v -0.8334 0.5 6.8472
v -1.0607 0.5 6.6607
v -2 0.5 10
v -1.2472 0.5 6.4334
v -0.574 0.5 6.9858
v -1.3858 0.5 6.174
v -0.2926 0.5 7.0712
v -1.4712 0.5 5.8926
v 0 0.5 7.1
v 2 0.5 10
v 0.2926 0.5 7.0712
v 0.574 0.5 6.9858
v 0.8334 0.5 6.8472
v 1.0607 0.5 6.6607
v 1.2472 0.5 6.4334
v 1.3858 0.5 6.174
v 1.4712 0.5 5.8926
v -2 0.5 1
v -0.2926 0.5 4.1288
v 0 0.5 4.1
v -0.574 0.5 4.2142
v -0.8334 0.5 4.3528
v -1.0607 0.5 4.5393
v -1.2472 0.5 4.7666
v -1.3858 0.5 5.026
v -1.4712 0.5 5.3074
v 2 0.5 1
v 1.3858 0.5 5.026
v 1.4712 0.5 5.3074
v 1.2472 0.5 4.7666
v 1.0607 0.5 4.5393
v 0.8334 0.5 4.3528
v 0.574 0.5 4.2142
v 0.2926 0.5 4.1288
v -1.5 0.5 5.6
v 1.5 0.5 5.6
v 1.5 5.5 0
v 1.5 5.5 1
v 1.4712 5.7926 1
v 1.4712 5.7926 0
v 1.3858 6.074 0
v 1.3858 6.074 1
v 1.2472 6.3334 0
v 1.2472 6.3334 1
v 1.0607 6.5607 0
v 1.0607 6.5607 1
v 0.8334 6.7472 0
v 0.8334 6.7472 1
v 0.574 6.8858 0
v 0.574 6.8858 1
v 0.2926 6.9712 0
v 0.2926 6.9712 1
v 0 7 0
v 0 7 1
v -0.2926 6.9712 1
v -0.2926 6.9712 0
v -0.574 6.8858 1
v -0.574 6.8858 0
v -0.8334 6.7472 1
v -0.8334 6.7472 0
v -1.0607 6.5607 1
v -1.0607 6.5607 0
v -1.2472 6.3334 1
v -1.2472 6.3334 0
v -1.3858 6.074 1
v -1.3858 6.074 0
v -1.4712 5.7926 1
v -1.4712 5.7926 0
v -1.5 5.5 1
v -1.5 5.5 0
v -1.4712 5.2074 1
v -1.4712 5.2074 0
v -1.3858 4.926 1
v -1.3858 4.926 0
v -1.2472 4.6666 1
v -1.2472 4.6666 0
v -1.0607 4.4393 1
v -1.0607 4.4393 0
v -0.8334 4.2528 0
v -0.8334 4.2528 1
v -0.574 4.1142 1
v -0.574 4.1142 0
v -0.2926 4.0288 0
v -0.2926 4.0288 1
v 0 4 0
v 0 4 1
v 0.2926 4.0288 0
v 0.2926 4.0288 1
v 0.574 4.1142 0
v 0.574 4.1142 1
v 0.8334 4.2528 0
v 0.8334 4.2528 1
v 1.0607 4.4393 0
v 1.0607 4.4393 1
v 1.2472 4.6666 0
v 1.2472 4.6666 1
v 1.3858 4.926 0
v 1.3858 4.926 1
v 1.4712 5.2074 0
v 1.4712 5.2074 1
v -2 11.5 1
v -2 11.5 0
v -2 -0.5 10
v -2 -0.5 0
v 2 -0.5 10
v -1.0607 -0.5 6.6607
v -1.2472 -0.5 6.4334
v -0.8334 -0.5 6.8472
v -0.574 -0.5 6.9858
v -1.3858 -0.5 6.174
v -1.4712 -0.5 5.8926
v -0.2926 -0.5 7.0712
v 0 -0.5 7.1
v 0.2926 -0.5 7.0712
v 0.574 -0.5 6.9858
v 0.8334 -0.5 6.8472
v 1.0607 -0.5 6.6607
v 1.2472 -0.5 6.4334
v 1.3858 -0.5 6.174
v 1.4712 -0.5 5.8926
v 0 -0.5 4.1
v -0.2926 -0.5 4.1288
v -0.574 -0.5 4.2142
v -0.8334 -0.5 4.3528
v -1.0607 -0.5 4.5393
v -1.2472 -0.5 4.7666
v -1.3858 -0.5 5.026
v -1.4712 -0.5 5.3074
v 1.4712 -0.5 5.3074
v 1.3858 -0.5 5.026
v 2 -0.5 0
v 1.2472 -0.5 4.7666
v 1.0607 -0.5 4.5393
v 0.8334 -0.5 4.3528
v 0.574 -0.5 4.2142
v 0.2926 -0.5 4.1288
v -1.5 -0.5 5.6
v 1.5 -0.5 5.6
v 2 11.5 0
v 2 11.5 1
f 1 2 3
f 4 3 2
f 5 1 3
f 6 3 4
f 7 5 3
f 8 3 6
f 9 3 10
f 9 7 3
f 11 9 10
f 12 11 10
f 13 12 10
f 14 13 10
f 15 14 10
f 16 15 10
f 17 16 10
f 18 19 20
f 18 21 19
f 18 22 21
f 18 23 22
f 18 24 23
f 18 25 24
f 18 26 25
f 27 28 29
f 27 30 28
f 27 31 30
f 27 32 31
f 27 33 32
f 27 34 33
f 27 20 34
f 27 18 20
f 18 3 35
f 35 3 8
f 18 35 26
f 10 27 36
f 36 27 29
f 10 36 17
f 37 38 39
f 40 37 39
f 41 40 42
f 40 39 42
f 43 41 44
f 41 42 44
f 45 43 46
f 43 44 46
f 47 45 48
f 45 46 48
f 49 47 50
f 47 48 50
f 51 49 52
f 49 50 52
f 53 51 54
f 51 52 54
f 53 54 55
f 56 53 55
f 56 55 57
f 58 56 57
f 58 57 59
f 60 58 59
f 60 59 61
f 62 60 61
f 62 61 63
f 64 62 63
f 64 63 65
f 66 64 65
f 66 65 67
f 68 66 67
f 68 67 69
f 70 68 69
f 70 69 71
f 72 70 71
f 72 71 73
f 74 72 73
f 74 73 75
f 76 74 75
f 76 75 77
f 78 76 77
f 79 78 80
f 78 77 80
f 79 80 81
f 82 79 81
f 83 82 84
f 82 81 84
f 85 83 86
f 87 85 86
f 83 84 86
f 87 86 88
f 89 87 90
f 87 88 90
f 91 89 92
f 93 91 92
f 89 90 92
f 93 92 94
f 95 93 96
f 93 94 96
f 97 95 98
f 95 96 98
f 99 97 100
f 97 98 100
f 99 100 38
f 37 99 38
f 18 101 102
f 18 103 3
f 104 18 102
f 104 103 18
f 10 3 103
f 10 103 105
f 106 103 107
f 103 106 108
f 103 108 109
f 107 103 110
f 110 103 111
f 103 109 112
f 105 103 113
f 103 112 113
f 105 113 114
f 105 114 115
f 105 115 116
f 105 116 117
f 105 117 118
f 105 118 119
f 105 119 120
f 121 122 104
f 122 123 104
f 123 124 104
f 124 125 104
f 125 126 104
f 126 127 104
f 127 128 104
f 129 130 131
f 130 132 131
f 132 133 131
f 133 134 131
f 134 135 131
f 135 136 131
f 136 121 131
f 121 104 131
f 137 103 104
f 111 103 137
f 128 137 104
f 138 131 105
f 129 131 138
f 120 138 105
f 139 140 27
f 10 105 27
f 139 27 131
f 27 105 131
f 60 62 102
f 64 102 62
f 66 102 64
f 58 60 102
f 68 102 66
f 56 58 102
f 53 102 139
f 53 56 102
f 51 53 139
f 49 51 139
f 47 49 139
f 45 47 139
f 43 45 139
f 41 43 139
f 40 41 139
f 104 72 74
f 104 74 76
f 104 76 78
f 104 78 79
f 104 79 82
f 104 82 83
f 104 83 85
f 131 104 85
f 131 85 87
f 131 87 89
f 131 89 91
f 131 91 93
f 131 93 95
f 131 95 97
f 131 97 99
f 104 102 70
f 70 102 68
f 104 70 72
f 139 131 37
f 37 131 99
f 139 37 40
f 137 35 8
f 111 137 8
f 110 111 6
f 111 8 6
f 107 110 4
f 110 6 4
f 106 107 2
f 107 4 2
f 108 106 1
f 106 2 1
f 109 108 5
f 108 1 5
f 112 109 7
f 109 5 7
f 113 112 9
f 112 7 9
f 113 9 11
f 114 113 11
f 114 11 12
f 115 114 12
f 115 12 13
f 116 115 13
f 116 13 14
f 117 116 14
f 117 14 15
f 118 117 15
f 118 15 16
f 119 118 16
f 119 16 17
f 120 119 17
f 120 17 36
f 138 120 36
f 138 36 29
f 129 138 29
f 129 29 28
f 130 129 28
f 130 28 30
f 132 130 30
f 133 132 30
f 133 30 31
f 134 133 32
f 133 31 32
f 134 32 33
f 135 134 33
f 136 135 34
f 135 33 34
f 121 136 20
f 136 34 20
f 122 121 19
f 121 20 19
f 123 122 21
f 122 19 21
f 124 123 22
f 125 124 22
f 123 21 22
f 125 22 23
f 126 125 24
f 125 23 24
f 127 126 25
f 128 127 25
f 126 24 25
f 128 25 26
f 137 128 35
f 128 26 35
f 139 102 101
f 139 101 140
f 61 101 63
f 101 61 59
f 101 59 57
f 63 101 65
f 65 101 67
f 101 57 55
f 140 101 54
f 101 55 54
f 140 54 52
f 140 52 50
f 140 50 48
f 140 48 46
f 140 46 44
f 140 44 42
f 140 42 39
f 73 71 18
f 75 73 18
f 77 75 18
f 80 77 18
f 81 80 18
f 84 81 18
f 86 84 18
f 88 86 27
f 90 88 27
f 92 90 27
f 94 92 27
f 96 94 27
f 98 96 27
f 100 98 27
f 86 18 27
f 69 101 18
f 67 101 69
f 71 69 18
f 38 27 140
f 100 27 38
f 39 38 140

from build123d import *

# Parameters (mm, degrees)
SKETCH1_W           = 4
SKETCH1_H           = 1
BOSS_EXTRUDE1_DEPTH = 10
SKETCH11_W          = 4
SKETCH11_H          = 1
BOSS_EXTRUDE2_DEPTH = 11
SKETCH12_R          = 1.5
CUT_EXTRUDE1_DEPTH  = 10
SKETCH13_R          = 1.5
CUT_EXTRUDE2_DEPTH  = 10


with BuildPart() as part:
    # Sketch1 → Boss-Extrude1 (new body)
    with BuildSketch(Plane.XY):
        Rectangle(SKETCH1_W, SKETCH1_H)
    extrude(amount=BOSS_EXTRUDE1_DEPTH)

    # Sketch11 → Boss-Extrude2 (add)
    with BuildSketch(Plane(origin=(0, 0.5, 0), x_dir=(1, 0, 0), z_dir=(0, 1, 0))):
        with Locations((0, -0.5)):
            Rectangle(SKETCH11_W, SKETCH11_H)
    extrude(amount=BOSS_EXTRUDE2_DEPTH)

    # Sketch12 → Cut-Extrude1 (cut)
    with BuildSketch(Plane(origin=(0, 0.5, 0), x_dir=(1, 0, 0), z_dir=(0, 1, 0))):
        with Locations(Location((0, -5.6, 0), (0, 0, 180))):
            Circle(SKETCH12_R)
    extrude(amount=-CUT_EXTRUDE1_DEPTH, mode=Mode.SUBTRACT)

    # Sketch13 → Cut-Extrude2 (cut)
    with BuildSketch(Plane.XY.offset(1)):
        with Locations((0, 5.5)):
            Circle(SKETCH13_R)
    extrude(amount=-CUT_EXTRUDE2_DEPTH, mode=Mode.SUBTRACT)


solid = part.part
